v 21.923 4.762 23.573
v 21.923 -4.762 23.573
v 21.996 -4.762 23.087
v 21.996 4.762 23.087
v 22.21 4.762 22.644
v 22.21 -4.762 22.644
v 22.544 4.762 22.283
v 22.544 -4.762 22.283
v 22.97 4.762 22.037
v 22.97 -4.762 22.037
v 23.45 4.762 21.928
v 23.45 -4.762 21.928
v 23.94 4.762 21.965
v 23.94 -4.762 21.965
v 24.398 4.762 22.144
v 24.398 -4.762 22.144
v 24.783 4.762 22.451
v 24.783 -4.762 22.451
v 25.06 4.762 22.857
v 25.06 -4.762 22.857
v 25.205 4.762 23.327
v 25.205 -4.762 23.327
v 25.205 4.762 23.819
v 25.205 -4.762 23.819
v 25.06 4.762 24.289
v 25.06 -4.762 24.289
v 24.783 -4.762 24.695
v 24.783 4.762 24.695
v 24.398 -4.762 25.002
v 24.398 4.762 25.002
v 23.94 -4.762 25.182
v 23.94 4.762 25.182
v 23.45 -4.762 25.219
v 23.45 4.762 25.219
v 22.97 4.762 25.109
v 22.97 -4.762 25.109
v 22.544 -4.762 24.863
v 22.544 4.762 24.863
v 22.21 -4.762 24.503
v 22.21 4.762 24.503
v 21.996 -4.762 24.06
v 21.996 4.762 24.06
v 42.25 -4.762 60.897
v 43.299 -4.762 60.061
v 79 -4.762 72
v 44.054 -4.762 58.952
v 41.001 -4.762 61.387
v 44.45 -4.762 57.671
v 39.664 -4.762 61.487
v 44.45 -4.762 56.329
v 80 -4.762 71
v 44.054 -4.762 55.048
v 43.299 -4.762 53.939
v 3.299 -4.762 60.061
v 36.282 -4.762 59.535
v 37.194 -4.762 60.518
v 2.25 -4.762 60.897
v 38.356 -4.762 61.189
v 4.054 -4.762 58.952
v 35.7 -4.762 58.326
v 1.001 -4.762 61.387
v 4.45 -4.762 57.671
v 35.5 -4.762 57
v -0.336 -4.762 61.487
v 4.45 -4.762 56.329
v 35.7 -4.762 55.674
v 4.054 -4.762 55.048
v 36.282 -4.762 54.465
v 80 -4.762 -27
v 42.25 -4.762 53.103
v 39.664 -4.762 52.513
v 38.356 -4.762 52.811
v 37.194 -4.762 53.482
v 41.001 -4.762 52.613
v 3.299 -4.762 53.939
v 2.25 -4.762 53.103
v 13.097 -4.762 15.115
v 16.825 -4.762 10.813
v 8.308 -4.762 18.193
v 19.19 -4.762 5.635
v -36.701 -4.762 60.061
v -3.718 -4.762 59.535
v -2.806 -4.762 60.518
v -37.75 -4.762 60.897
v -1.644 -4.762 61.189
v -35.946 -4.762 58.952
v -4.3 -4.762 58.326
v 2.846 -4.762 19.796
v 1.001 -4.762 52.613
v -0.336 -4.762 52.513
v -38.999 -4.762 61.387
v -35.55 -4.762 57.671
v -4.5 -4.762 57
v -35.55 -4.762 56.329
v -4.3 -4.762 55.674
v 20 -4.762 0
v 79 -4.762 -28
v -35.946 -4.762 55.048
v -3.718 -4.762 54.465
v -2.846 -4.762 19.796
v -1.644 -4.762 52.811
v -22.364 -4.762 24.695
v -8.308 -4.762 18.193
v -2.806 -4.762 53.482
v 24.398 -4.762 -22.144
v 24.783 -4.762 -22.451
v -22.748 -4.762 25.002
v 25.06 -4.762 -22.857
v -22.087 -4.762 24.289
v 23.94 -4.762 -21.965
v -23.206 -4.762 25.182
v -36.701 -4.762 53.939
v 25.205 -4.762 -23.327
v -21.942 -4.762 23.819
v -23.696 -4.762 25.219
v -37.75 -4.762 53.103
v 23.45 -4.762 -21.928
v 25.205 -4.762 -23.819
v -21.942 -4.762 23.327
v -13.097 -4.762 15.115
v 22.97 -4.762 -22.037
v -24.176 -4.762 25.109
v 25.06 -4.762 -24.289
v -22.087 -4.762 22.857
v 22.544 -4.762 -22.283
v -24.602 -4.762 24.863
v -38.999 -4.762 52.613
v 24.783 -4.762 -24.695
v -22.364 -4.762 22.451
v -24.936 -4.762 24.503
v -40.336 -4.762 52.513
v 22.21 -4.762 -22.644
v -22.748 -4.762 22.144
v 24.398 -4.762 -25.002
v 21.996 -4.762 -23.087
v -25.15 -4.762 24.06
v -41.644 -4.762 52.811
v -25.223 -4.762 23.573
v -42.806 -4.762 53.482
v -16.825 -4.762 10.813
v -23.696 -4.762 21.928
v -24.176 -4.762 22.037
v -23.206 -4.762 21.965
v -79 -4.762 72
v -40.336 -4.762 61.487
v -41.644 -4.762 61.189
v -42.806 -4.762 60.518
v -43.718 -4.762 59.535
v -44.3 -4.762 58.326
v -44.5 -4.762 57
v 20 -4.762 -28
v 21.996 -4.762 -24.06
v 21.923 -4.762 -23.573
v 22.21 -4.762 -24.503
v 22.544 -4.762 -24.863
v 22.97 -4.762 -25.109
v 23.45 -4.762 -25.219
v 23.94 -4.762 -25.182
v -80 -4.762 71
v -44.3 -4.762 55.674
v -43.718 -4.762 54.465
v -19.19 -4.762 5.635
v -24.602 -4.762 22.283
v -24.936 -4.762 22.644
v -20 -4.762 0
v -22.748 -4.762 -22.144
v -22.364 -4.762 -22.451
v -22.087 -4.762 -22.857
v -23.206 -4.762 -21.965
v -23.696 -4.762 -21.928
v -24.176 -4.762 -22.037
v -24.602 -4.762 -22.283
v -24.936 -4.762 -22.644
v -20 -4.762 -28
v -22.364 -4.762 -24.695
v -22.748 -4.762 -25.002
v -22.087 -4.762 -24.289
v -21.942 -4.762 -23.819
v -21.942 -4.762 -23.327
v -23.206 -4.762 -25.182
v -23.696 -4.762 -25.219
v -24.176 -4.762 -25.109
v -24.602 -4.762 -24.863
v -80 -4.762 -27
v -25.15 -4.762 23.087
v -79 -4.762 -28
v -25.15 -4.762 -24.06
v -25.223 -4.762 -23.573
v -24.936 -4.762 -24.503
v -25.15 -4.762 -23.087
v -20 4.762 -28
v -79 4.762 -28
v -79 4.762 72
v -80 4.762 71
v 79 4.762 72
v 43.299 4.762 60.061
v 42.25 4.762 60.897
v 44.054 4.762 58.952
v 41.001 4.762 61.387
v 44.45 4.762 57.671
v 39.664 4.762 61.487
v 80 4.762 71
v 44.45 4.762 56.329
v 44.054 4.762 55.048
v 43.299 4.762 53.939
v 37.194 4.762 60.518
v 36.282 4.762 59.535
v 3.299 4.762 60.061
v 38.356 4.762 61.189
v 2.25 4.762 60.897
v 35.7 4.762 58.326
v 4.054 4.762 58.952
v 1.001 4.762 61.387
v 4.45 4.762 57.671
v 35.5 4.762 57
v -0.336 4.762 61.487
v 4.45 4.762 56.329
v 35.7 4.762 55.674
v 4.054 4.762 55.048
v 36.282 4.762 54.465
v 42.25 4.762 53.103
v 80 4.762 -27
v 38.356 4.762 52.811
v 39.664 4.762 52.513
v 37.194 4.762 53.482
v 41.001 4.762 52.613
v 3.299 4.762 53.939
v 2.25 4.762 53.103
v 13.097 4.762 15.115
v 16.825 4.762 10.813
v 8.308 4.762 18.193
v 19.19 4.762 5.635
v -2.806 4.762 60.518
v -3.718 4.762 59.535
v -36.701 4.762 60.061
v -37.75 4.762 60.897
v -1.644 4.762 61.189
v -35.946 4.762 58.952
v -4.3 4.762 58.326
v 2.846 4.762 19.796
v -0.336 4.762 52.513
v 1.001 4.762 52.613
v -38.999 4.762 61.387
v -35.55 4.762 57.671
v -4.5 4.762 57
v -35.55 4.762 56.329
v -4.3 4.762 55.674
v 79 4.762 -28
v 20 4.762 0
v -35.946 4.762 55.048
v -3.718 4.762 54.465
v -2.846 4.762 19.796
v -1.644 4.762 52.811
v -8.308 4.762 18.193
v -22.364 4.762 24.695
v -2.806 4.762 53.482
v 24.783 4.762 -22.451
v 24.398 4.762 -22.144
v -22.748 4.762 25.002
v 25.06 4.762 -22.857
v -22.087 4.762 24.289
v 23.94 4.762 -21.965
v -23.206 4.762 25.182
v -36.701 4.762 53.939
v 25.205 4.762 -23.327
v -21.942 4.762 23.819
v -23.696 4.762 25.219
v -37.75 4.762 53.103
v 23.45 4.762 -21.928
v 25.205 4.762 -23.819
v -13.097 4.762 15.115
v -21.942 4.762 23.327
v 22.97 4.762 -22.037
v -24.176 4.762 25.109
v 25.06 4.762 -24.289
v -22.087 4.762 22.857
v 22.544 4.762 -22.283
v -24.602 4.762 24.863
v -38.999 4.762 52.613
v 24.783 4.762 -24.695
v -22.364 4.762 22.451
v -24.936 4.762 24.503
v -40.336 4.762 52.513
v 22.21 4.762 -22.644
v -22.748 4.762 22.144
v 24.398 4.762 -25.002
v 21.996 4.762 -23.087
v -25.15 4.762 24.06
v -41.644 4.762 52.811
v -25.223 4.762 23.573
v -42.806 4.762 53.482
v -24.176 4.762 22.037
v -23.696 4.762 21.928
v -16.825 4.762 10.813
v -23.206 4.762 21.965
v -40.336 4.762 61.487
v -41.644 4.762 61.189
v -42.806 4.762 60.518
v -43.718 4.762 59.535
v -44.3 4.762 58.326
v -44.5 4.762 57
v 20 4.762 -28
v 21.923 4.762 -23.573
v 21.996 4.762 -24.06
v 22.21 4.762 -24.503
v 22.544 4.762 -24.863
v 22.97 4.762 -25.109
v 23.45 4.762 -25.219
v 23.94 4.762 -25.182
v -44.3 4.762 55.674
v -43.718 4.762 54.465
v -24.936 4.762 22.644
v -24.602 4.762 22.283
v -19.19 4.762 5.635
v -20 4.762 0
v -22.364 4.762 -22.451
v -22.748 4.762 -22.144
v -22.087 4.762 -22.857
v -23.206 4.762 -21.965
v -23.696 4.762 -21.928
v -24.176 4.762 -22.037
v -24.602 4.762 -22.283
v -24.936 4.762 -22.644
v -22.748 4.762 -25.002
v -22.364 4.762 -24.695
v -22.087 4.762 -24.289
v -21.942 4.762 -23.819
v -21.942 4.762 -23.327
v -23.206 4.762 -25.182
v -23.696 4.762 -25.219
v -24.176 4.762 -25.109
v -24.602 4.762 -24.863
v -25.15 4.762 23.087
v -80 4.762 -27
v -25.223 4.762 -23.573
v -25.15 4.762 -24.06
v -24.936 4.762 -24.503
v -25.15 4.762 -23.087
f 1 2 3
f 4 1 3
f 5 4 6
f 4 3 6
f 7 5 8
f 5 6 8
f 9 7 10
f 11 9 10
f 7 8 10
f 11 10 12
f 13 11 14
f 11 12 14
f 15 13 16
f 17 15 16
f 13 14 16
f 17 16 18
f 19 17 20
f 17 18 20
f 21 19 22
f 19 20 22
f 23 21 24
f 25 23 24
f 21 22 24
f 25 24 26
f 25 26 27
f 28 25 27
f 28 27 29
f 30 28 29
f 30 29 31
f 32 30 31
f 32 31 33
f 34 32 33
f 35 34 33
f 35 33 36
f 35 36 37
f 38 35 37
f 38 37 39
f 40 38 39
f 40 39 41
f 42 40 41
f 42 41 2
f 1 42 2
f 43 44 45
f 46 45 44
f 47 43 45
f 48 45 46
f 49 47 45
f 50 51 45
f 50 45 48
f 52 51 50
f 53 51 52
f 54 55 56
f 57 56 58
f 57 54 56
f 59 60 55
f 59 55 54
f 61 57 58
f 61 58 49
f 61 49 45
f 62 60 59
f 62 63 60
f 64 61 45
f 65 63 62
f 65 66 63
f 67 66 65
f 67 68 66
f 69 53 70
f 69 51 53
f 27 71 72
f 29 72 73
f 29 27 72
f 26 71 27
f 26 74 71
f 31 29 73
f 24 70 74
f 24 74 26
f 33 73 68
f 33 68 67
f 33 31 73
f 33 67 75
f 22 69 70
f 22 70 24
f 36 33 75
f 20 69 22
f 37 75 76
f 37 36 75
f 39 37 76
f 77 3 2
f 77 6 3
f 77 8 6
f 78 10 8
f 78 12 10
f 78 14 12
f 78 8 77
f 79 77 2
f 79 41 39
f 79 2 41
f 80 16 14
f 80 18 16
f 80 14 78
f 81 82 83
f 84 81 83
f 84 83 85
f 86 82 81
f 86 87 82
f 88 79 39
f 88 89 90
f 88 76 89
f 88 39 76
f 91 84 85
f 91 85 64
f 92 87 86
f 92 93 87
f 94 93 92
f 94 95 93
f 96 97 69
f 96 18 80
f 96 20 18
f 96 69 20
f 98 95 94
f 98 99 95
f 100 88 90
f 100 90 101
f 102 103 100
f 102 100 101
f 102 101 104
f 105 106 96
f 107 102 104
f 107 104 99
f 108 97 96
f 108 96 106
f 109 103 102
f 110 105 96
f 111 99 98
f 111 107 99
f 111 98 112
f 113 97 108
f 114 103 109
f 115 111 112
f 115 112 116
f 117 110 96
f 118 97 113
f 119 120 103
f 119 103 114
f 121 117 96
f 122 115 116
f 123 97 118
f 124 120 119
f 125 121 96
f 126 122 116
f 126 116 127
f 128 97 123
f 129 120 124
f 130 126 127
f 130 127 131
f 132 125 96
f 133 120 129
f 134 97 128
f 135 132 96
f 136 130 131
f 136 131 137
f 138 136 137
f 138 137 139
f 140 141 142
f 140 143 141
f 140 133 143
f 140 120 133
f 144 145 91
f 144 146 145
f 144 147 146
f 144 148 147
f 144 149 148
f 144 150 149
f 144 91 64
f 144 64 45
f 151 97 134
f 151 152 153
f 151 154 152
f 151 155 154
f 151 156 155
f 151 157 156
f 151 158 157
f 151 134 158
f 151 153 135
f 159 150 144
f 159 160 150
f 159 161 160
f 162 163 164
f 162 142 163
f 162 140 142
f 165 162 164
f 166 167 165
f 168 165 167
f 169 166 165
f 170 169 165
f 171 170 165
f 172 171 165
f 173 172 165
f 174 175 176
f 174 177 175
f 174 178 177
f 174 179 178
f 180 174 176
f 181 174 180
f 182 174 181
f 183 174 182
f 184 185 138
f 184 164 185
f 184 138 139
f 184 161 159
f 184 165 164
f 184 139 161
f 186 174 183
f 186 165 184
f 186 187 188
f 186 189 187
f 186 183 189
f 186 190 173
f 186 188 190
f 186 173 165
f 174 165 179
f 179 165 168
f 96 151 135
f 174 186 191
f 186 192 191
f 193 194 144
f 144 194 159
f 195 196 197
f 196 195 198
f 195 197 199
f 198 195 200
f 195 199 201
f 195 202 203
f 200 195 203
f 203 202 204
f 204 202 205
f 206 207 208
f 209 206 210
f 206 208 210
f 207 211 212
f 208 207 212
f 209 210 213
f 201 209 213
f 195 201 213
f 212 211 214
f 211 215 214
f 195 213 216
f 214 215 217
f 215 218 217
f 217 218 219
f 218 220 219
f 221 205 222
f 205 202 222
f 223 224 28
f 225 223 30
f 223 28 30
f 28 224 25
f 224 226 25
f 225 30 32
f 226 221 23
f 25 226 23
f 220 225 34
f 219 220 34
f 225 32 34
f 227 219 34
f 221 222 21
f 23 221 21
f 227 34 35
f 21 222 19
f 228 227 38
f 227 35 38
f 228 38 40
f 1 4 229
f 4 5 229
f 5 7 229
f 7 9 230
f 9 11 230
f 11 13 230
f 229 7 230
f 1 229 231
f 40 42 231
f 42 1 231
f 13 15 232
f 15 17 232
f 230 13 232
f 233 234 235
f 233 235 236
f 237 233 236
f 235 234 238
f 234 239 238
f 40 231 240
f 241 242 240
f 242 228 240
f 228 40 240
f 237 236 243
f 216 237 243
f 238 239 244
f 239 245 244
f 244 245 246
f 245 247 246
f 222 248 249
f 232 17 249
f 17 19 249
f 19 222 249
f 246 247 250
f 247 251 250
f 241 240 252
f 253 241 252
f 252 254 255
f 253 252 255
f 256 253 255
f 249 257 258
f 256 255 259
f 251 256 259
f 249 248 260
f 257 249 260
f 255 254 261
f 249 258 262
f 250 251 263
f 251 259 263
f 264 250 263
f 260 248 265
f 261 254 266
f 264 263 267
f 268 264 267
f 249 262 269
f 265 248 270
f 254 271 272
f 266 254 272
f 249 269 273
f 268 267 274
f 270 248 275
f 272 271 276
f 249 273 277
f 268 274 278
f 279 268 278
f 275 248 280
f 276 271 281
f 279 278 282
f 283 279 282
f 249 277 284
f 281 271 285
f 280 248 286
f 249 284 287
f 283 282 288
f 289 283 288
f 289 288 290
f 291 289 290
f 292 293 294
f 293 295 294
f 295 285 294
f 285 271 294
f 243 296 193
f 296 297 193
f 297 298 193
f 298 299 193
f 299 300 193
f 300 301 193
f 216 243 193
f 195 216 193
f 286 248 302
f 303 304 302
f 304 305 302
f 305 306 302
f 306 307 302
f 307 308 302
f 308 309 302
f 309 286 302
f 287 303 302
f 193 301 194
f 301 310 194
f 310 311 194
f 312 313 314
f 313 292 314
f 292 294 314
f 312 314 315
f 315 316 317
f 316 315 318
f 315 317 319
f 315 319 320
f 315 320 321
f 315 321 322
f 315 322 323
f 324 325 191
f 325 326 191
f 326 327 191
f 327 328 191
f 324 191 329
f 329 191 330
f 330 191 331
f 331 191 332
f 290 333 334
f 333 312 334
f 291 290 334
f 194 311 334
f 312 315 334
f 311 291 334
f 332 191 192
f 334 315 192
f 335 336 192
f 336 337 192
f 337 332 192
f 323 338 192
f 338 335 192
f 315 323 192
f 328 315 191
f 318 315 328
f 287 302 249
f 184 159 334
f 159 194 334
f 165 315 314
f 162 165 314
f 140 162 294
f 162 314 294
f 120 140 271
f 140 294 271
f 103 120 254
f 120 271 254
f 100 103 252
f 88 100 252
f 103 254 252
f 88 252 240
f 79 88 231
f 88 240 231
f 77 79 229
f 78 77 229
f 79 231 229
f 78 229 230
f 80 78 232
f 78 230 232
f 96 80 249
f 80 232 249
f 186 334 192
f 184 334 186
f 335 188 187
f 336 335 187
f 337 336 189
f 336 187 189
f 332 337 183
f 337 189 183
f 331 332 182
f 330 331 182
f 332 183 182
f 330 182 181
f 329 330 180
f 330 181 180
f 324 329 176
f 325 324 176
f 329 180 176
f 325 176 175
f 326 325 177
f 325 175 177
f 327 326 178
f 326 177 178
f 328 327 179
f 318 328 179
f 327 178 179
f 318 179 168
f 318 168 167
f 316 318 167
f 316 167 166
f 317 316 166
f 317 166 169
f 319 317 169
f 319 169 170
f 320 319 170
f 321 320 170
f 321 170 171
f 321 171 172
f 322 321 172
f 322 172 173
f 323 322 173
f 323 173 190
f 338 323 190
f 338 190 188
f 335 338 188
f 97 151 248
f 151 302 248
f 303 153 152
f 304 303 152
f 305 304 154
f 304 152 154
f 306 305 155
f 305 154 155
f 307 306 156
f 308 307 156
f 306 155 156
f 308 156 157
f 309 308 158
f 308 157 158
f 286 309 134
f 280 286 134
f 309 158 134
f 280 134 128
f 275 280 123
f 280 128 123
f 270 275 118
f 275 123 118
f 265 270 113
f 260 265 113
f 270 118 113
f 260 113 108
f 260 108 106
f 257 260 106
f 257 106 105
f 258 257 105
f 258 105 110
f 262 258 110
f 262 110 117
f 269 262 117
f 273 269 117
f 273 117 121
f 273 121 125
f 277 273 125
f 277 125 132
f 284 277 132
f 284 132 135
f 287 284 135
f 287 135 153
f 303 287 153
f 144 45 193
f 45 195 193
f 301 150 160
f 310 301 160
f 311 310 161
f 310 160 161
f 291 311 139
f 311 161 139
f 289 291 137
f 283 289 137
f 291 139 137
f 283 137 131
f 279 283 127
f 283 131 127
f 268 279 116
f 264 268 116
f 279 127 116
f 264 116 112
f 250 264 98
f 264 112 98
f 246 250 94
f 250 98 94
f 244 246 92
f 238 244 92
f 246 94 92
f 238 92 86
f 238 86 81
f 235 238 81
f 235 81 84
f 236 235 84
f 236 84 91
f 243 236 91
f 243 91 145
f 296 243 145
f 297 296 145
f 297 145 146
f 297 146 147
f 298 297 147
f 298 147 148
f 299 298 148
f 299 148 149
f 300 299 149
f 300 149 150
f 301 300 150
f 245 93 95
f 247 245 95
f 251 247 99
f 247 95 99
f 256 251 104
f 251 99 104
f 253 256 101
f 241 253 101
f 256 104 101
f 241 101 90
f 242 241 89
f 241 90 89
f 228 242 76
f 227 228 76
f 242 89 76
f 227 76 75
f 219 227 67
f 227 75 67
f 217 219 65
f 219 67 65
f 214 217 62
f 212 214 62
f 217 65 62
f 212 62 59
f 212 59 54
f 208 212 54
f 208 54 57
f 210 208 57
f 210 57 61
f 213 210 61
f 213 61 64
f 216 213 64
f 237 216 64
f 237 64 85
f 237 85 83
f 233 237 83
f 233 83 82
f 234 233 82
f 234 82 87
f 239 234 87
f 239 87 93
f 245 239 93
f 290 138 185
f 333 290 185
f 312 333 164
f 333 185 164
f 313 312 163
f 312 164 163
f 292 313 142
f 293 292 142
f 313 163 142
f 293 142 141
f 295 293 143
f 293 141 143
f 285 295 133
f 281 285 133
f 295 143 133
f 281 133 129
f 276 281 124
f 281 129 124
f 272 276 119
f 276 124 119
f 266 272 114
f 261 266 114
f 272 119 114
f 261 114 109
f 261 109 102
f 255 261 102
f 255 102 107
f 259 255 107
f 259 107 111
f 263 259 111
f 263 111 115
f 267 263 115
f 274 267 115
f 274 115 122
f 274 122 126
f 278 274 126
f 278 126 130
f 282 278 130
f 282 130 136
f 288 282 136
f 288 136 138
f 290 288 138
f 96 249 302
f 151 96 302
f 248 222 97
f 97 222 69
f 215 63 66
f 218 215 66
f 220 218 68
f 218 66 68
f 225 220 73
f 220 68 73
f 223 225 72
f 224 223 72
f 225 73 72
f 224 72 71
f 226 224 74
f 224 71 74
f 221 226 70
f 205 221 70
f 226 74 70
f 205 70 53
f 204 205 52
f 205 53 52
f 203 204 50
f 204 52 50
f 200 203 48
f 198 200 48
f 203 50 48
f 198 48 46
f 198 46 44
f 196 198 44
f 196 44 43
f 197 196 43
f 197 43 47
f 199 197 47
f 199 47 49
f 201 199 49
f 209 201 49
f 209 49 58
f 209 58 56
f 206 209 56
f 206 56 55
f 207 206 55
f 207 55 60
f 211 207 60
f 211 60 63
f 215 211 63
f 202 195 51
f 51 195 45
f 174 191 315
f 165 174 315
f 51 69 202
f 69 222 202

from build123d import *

# Parameters (mm, degrees)
BOSS_EXTRUDE1_DEPTH   = 4.7625
M8_CLEARANCE_HOLE1_D  = 9
M4X0_7_TAPPED_HOLE2_D = 3.3
CHAMFER1_SIZE         = 1


with BuildPart() as part:
    # Sketch1 → Boss-Extrude1 (new, symmetric)
    with BuildSketch(Plane(origin=(0, 0, 0), x_dir=(1, 0, 0), z_dir=(0, 1, 0))):
        with BuildLine():
            Line((20, 0), (20, 28))
            Line((20, 28), (80, 28))
            Line((80, 28), (80, -72))
            Line((80, -72), (-80, -72))
            Line((-80, -72), (-80, 28))
            Line((-80, 28), (-20, 28))
            Line((-20, 28), (-20, 0))
            ThreePointArc((-20, 0), (0, -20), (20, 0))
        make_face()
    extrude(amount=BOSS_EXTRUDE1_DEPTH, both=True)

    # M8 Clearance Hole1 (through all)
    with Locations(Plane(origin=(0, 4.7625, 0), x_dir=(1, 0, 0), z_dir=(0, 1, 0))):
        with Locations((-40, -57), (0, -57), (40, -57)):
            Hole(M8_CLEARANCE_HOLE1_D / 2)

    # M4x0.7 Tapped Hole2 (through all)
    with Locations(Plane(origin=(0, 4.7625, 0), x_dir=(1, 0, 0), z_dir=(0, 1, 0))):
        with Locations((-23.573172318, -23.573172318), (-23.573172318, 23.573172318), (23.573172318, 23.573172318), (23.573172318, -23.573172318)):
            Hole(M4X0_7_TAPPED_HOLE2_D / 2)

    # Chamfer1
    chamfer1_edges = [part.edges().sort_by_distance(p)[0] for p in [
        (80, 0, -28),
        (80, 0, 72),
        (-80, 0, 72),
        (-80, 0, -28),
    ]]
    chamfer(chamfer1_edges, length=CHAMFER1_SIZE)


solid = part.part
